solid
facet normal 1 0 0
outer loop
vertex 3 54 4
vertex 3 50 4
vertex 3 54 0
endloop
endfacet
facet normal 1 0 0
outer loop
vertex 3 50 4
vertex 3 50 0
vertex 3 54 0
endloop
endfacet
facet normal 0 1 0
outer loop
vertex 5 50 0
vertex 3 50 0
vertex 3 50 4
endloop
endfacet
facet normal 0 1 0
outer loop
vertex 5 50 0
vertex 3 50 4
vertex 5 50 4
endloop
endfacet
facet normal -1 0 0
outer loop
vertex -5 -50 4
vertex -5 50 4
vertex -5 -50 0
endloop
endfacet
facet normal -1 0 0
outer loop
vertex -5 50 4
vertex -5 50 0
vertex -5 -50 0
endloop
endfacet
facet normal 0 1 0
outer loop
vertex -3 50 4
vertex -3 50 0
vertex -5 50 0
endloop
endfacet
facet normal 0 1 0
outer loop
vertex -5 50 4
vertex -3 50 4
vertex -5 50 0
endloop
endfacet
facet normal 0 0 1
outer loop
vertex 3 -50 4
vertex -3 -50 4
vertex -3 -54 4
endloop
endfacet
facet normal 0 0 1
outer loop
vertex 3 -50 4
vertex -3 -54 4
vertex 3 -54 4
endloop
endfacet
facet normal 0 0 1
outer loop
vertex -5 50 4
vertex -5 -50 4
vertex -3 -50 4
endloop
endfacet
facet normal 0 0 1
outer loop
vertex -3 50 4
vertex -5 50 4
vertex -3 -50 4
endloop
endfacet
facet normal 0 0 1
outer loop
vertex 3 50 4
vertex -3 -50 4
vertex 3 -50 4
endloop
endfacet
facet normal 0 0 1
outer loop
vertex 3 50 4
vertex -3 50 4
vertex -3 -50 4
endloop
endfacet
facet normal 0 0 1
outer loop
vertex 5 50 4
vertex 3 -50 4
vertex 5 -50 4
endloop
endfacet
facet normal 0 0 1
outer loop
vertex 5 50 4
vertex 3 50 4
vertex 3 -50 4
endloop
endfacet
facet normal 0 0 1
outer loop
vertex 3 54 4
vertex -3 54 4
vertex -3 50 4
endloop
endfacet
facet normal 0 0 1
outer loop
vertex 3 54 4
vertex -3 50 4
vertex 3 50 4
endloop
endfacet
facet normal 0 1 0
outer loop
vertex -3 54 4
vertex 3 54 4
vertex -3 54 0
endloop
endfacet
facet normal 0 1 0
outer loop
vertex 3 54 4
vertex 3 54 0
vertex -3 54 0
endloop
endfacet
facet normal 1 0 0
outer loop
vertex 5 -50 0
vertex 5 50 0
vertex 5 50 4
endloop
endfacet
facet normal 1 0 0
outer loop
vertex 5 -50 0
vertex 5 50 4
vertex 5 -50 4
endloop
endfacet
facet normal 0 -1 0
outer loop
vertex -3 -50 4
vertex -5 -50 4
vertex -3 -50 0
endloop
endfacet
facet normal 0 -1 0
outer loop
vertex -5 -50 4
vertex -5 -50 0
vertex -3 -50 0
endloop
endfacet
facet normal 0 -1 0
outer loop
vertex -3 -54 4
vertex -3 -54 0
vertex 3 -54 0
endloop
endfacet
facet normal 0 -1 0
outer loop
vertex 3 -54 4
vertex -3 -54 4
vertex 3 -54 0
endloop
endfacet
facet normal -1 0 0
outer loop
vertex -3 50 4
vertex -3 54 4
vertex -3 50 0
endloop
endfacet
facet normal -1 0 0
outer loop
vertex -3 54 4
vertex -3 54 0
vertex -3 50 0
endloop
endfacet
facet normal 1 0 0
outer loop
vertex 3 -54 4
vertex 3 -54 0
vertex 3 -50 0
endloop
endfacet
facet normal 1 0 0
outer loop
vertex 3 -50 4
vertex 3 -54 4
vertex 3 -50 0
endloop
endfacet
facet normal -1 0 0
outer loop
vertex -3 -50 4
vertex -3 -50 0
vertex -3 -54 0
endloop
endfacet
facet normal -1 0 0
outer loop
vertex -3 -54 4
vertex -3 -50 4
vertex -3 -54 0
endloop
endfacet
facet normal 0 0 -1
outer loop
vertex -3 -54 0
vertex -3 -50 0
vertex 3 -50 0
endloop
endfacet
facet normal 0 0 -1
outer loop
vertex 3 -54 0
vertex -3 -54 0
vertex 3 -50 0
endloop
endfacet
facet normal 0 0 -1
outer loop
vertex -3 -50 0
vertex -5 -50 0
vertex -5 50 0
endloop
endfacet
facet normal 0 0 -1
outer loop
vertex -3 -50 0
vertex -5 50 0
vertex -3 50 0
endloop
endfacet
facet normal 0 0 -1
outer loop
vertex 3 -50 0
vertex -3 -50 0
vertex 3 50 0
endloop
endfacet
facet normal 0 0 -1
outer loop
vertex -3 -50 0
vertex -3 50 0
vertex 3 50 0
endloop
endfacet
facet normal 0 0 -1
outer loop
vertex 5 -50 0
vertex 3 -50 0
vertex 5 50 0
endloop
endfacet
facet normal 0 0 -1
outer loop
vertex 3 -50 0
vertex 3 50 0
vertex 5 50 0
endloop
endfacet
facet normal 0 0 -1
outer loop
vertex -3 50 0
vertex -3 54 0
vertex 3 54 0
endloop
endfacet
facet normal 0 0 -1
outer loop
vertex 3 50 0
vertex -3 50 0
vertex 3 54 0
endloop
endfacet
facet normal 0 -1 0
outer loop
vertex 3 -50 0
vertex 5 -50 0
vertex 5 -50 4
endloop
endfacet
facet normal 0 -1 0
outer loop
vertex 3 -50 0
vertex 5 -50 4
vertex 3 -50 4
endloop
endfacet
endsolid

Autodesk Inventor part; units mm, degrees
ref_plane "YZ Plane" through (0, 0, 0) normal (1, 0, 0) x (0, 1, 0)
ref_plane "XZ Plane" through (0, 0, 0) normal (0, 1, 0) x (-1, 0, 0)
ref_plane "XY Plane" through (0, 0, 0) normal (0, 0, 1) x (1, 0, 0)
sketch "Sketch1" plane through (0, 0, 0) normal (0, 0, 1) x (1, 0, 0)
  line L0 (3, 54) -> (-3, 54)
  line L1 (-3, 54) -> (-3, 50)
  line L2 (-3, -54) -> (3, -54)
  line L3 (3, -54) -> (3, -50)
  line L4 (-3, 50) -> (-5, 50)
  line L5 (-5, 50) -> (-5, -50)
  line L6 (-5, -50) -> (-3, -50)
  line L7 (-3, -50) -> (-3, 50) construction
  line L8 (-3, 50) -> (-3, -50) construction
  line L9 (-3, -50) -> (-3, -54)
  line L10 (0, 54) -> (0, -54)
  line L11 (3, 50) -> (5, 50)
  line L12 (5, 50) -> (5, -50)
  line L13 (5, -50) -> (3, -50)
  line L14 (3, 50) -> (3, 54)
  line L15 (3, -50) -> (3, 50) construction
  point P0 (0, 0)
  point P1 (-4, -50)
  point P2 (0, 0)
  point P3 (0, 0)
  dimension "d0" = 6
  dimension "d1" = 108
  dimension "d2" = 4
  dimension "d3" = 4
  dimension "d4" = 2
extrude "Extrusion1" add sketch "Sketch1" along normal blind 4
properties part number "MagnetHolder" material "Wood (Oak)"
